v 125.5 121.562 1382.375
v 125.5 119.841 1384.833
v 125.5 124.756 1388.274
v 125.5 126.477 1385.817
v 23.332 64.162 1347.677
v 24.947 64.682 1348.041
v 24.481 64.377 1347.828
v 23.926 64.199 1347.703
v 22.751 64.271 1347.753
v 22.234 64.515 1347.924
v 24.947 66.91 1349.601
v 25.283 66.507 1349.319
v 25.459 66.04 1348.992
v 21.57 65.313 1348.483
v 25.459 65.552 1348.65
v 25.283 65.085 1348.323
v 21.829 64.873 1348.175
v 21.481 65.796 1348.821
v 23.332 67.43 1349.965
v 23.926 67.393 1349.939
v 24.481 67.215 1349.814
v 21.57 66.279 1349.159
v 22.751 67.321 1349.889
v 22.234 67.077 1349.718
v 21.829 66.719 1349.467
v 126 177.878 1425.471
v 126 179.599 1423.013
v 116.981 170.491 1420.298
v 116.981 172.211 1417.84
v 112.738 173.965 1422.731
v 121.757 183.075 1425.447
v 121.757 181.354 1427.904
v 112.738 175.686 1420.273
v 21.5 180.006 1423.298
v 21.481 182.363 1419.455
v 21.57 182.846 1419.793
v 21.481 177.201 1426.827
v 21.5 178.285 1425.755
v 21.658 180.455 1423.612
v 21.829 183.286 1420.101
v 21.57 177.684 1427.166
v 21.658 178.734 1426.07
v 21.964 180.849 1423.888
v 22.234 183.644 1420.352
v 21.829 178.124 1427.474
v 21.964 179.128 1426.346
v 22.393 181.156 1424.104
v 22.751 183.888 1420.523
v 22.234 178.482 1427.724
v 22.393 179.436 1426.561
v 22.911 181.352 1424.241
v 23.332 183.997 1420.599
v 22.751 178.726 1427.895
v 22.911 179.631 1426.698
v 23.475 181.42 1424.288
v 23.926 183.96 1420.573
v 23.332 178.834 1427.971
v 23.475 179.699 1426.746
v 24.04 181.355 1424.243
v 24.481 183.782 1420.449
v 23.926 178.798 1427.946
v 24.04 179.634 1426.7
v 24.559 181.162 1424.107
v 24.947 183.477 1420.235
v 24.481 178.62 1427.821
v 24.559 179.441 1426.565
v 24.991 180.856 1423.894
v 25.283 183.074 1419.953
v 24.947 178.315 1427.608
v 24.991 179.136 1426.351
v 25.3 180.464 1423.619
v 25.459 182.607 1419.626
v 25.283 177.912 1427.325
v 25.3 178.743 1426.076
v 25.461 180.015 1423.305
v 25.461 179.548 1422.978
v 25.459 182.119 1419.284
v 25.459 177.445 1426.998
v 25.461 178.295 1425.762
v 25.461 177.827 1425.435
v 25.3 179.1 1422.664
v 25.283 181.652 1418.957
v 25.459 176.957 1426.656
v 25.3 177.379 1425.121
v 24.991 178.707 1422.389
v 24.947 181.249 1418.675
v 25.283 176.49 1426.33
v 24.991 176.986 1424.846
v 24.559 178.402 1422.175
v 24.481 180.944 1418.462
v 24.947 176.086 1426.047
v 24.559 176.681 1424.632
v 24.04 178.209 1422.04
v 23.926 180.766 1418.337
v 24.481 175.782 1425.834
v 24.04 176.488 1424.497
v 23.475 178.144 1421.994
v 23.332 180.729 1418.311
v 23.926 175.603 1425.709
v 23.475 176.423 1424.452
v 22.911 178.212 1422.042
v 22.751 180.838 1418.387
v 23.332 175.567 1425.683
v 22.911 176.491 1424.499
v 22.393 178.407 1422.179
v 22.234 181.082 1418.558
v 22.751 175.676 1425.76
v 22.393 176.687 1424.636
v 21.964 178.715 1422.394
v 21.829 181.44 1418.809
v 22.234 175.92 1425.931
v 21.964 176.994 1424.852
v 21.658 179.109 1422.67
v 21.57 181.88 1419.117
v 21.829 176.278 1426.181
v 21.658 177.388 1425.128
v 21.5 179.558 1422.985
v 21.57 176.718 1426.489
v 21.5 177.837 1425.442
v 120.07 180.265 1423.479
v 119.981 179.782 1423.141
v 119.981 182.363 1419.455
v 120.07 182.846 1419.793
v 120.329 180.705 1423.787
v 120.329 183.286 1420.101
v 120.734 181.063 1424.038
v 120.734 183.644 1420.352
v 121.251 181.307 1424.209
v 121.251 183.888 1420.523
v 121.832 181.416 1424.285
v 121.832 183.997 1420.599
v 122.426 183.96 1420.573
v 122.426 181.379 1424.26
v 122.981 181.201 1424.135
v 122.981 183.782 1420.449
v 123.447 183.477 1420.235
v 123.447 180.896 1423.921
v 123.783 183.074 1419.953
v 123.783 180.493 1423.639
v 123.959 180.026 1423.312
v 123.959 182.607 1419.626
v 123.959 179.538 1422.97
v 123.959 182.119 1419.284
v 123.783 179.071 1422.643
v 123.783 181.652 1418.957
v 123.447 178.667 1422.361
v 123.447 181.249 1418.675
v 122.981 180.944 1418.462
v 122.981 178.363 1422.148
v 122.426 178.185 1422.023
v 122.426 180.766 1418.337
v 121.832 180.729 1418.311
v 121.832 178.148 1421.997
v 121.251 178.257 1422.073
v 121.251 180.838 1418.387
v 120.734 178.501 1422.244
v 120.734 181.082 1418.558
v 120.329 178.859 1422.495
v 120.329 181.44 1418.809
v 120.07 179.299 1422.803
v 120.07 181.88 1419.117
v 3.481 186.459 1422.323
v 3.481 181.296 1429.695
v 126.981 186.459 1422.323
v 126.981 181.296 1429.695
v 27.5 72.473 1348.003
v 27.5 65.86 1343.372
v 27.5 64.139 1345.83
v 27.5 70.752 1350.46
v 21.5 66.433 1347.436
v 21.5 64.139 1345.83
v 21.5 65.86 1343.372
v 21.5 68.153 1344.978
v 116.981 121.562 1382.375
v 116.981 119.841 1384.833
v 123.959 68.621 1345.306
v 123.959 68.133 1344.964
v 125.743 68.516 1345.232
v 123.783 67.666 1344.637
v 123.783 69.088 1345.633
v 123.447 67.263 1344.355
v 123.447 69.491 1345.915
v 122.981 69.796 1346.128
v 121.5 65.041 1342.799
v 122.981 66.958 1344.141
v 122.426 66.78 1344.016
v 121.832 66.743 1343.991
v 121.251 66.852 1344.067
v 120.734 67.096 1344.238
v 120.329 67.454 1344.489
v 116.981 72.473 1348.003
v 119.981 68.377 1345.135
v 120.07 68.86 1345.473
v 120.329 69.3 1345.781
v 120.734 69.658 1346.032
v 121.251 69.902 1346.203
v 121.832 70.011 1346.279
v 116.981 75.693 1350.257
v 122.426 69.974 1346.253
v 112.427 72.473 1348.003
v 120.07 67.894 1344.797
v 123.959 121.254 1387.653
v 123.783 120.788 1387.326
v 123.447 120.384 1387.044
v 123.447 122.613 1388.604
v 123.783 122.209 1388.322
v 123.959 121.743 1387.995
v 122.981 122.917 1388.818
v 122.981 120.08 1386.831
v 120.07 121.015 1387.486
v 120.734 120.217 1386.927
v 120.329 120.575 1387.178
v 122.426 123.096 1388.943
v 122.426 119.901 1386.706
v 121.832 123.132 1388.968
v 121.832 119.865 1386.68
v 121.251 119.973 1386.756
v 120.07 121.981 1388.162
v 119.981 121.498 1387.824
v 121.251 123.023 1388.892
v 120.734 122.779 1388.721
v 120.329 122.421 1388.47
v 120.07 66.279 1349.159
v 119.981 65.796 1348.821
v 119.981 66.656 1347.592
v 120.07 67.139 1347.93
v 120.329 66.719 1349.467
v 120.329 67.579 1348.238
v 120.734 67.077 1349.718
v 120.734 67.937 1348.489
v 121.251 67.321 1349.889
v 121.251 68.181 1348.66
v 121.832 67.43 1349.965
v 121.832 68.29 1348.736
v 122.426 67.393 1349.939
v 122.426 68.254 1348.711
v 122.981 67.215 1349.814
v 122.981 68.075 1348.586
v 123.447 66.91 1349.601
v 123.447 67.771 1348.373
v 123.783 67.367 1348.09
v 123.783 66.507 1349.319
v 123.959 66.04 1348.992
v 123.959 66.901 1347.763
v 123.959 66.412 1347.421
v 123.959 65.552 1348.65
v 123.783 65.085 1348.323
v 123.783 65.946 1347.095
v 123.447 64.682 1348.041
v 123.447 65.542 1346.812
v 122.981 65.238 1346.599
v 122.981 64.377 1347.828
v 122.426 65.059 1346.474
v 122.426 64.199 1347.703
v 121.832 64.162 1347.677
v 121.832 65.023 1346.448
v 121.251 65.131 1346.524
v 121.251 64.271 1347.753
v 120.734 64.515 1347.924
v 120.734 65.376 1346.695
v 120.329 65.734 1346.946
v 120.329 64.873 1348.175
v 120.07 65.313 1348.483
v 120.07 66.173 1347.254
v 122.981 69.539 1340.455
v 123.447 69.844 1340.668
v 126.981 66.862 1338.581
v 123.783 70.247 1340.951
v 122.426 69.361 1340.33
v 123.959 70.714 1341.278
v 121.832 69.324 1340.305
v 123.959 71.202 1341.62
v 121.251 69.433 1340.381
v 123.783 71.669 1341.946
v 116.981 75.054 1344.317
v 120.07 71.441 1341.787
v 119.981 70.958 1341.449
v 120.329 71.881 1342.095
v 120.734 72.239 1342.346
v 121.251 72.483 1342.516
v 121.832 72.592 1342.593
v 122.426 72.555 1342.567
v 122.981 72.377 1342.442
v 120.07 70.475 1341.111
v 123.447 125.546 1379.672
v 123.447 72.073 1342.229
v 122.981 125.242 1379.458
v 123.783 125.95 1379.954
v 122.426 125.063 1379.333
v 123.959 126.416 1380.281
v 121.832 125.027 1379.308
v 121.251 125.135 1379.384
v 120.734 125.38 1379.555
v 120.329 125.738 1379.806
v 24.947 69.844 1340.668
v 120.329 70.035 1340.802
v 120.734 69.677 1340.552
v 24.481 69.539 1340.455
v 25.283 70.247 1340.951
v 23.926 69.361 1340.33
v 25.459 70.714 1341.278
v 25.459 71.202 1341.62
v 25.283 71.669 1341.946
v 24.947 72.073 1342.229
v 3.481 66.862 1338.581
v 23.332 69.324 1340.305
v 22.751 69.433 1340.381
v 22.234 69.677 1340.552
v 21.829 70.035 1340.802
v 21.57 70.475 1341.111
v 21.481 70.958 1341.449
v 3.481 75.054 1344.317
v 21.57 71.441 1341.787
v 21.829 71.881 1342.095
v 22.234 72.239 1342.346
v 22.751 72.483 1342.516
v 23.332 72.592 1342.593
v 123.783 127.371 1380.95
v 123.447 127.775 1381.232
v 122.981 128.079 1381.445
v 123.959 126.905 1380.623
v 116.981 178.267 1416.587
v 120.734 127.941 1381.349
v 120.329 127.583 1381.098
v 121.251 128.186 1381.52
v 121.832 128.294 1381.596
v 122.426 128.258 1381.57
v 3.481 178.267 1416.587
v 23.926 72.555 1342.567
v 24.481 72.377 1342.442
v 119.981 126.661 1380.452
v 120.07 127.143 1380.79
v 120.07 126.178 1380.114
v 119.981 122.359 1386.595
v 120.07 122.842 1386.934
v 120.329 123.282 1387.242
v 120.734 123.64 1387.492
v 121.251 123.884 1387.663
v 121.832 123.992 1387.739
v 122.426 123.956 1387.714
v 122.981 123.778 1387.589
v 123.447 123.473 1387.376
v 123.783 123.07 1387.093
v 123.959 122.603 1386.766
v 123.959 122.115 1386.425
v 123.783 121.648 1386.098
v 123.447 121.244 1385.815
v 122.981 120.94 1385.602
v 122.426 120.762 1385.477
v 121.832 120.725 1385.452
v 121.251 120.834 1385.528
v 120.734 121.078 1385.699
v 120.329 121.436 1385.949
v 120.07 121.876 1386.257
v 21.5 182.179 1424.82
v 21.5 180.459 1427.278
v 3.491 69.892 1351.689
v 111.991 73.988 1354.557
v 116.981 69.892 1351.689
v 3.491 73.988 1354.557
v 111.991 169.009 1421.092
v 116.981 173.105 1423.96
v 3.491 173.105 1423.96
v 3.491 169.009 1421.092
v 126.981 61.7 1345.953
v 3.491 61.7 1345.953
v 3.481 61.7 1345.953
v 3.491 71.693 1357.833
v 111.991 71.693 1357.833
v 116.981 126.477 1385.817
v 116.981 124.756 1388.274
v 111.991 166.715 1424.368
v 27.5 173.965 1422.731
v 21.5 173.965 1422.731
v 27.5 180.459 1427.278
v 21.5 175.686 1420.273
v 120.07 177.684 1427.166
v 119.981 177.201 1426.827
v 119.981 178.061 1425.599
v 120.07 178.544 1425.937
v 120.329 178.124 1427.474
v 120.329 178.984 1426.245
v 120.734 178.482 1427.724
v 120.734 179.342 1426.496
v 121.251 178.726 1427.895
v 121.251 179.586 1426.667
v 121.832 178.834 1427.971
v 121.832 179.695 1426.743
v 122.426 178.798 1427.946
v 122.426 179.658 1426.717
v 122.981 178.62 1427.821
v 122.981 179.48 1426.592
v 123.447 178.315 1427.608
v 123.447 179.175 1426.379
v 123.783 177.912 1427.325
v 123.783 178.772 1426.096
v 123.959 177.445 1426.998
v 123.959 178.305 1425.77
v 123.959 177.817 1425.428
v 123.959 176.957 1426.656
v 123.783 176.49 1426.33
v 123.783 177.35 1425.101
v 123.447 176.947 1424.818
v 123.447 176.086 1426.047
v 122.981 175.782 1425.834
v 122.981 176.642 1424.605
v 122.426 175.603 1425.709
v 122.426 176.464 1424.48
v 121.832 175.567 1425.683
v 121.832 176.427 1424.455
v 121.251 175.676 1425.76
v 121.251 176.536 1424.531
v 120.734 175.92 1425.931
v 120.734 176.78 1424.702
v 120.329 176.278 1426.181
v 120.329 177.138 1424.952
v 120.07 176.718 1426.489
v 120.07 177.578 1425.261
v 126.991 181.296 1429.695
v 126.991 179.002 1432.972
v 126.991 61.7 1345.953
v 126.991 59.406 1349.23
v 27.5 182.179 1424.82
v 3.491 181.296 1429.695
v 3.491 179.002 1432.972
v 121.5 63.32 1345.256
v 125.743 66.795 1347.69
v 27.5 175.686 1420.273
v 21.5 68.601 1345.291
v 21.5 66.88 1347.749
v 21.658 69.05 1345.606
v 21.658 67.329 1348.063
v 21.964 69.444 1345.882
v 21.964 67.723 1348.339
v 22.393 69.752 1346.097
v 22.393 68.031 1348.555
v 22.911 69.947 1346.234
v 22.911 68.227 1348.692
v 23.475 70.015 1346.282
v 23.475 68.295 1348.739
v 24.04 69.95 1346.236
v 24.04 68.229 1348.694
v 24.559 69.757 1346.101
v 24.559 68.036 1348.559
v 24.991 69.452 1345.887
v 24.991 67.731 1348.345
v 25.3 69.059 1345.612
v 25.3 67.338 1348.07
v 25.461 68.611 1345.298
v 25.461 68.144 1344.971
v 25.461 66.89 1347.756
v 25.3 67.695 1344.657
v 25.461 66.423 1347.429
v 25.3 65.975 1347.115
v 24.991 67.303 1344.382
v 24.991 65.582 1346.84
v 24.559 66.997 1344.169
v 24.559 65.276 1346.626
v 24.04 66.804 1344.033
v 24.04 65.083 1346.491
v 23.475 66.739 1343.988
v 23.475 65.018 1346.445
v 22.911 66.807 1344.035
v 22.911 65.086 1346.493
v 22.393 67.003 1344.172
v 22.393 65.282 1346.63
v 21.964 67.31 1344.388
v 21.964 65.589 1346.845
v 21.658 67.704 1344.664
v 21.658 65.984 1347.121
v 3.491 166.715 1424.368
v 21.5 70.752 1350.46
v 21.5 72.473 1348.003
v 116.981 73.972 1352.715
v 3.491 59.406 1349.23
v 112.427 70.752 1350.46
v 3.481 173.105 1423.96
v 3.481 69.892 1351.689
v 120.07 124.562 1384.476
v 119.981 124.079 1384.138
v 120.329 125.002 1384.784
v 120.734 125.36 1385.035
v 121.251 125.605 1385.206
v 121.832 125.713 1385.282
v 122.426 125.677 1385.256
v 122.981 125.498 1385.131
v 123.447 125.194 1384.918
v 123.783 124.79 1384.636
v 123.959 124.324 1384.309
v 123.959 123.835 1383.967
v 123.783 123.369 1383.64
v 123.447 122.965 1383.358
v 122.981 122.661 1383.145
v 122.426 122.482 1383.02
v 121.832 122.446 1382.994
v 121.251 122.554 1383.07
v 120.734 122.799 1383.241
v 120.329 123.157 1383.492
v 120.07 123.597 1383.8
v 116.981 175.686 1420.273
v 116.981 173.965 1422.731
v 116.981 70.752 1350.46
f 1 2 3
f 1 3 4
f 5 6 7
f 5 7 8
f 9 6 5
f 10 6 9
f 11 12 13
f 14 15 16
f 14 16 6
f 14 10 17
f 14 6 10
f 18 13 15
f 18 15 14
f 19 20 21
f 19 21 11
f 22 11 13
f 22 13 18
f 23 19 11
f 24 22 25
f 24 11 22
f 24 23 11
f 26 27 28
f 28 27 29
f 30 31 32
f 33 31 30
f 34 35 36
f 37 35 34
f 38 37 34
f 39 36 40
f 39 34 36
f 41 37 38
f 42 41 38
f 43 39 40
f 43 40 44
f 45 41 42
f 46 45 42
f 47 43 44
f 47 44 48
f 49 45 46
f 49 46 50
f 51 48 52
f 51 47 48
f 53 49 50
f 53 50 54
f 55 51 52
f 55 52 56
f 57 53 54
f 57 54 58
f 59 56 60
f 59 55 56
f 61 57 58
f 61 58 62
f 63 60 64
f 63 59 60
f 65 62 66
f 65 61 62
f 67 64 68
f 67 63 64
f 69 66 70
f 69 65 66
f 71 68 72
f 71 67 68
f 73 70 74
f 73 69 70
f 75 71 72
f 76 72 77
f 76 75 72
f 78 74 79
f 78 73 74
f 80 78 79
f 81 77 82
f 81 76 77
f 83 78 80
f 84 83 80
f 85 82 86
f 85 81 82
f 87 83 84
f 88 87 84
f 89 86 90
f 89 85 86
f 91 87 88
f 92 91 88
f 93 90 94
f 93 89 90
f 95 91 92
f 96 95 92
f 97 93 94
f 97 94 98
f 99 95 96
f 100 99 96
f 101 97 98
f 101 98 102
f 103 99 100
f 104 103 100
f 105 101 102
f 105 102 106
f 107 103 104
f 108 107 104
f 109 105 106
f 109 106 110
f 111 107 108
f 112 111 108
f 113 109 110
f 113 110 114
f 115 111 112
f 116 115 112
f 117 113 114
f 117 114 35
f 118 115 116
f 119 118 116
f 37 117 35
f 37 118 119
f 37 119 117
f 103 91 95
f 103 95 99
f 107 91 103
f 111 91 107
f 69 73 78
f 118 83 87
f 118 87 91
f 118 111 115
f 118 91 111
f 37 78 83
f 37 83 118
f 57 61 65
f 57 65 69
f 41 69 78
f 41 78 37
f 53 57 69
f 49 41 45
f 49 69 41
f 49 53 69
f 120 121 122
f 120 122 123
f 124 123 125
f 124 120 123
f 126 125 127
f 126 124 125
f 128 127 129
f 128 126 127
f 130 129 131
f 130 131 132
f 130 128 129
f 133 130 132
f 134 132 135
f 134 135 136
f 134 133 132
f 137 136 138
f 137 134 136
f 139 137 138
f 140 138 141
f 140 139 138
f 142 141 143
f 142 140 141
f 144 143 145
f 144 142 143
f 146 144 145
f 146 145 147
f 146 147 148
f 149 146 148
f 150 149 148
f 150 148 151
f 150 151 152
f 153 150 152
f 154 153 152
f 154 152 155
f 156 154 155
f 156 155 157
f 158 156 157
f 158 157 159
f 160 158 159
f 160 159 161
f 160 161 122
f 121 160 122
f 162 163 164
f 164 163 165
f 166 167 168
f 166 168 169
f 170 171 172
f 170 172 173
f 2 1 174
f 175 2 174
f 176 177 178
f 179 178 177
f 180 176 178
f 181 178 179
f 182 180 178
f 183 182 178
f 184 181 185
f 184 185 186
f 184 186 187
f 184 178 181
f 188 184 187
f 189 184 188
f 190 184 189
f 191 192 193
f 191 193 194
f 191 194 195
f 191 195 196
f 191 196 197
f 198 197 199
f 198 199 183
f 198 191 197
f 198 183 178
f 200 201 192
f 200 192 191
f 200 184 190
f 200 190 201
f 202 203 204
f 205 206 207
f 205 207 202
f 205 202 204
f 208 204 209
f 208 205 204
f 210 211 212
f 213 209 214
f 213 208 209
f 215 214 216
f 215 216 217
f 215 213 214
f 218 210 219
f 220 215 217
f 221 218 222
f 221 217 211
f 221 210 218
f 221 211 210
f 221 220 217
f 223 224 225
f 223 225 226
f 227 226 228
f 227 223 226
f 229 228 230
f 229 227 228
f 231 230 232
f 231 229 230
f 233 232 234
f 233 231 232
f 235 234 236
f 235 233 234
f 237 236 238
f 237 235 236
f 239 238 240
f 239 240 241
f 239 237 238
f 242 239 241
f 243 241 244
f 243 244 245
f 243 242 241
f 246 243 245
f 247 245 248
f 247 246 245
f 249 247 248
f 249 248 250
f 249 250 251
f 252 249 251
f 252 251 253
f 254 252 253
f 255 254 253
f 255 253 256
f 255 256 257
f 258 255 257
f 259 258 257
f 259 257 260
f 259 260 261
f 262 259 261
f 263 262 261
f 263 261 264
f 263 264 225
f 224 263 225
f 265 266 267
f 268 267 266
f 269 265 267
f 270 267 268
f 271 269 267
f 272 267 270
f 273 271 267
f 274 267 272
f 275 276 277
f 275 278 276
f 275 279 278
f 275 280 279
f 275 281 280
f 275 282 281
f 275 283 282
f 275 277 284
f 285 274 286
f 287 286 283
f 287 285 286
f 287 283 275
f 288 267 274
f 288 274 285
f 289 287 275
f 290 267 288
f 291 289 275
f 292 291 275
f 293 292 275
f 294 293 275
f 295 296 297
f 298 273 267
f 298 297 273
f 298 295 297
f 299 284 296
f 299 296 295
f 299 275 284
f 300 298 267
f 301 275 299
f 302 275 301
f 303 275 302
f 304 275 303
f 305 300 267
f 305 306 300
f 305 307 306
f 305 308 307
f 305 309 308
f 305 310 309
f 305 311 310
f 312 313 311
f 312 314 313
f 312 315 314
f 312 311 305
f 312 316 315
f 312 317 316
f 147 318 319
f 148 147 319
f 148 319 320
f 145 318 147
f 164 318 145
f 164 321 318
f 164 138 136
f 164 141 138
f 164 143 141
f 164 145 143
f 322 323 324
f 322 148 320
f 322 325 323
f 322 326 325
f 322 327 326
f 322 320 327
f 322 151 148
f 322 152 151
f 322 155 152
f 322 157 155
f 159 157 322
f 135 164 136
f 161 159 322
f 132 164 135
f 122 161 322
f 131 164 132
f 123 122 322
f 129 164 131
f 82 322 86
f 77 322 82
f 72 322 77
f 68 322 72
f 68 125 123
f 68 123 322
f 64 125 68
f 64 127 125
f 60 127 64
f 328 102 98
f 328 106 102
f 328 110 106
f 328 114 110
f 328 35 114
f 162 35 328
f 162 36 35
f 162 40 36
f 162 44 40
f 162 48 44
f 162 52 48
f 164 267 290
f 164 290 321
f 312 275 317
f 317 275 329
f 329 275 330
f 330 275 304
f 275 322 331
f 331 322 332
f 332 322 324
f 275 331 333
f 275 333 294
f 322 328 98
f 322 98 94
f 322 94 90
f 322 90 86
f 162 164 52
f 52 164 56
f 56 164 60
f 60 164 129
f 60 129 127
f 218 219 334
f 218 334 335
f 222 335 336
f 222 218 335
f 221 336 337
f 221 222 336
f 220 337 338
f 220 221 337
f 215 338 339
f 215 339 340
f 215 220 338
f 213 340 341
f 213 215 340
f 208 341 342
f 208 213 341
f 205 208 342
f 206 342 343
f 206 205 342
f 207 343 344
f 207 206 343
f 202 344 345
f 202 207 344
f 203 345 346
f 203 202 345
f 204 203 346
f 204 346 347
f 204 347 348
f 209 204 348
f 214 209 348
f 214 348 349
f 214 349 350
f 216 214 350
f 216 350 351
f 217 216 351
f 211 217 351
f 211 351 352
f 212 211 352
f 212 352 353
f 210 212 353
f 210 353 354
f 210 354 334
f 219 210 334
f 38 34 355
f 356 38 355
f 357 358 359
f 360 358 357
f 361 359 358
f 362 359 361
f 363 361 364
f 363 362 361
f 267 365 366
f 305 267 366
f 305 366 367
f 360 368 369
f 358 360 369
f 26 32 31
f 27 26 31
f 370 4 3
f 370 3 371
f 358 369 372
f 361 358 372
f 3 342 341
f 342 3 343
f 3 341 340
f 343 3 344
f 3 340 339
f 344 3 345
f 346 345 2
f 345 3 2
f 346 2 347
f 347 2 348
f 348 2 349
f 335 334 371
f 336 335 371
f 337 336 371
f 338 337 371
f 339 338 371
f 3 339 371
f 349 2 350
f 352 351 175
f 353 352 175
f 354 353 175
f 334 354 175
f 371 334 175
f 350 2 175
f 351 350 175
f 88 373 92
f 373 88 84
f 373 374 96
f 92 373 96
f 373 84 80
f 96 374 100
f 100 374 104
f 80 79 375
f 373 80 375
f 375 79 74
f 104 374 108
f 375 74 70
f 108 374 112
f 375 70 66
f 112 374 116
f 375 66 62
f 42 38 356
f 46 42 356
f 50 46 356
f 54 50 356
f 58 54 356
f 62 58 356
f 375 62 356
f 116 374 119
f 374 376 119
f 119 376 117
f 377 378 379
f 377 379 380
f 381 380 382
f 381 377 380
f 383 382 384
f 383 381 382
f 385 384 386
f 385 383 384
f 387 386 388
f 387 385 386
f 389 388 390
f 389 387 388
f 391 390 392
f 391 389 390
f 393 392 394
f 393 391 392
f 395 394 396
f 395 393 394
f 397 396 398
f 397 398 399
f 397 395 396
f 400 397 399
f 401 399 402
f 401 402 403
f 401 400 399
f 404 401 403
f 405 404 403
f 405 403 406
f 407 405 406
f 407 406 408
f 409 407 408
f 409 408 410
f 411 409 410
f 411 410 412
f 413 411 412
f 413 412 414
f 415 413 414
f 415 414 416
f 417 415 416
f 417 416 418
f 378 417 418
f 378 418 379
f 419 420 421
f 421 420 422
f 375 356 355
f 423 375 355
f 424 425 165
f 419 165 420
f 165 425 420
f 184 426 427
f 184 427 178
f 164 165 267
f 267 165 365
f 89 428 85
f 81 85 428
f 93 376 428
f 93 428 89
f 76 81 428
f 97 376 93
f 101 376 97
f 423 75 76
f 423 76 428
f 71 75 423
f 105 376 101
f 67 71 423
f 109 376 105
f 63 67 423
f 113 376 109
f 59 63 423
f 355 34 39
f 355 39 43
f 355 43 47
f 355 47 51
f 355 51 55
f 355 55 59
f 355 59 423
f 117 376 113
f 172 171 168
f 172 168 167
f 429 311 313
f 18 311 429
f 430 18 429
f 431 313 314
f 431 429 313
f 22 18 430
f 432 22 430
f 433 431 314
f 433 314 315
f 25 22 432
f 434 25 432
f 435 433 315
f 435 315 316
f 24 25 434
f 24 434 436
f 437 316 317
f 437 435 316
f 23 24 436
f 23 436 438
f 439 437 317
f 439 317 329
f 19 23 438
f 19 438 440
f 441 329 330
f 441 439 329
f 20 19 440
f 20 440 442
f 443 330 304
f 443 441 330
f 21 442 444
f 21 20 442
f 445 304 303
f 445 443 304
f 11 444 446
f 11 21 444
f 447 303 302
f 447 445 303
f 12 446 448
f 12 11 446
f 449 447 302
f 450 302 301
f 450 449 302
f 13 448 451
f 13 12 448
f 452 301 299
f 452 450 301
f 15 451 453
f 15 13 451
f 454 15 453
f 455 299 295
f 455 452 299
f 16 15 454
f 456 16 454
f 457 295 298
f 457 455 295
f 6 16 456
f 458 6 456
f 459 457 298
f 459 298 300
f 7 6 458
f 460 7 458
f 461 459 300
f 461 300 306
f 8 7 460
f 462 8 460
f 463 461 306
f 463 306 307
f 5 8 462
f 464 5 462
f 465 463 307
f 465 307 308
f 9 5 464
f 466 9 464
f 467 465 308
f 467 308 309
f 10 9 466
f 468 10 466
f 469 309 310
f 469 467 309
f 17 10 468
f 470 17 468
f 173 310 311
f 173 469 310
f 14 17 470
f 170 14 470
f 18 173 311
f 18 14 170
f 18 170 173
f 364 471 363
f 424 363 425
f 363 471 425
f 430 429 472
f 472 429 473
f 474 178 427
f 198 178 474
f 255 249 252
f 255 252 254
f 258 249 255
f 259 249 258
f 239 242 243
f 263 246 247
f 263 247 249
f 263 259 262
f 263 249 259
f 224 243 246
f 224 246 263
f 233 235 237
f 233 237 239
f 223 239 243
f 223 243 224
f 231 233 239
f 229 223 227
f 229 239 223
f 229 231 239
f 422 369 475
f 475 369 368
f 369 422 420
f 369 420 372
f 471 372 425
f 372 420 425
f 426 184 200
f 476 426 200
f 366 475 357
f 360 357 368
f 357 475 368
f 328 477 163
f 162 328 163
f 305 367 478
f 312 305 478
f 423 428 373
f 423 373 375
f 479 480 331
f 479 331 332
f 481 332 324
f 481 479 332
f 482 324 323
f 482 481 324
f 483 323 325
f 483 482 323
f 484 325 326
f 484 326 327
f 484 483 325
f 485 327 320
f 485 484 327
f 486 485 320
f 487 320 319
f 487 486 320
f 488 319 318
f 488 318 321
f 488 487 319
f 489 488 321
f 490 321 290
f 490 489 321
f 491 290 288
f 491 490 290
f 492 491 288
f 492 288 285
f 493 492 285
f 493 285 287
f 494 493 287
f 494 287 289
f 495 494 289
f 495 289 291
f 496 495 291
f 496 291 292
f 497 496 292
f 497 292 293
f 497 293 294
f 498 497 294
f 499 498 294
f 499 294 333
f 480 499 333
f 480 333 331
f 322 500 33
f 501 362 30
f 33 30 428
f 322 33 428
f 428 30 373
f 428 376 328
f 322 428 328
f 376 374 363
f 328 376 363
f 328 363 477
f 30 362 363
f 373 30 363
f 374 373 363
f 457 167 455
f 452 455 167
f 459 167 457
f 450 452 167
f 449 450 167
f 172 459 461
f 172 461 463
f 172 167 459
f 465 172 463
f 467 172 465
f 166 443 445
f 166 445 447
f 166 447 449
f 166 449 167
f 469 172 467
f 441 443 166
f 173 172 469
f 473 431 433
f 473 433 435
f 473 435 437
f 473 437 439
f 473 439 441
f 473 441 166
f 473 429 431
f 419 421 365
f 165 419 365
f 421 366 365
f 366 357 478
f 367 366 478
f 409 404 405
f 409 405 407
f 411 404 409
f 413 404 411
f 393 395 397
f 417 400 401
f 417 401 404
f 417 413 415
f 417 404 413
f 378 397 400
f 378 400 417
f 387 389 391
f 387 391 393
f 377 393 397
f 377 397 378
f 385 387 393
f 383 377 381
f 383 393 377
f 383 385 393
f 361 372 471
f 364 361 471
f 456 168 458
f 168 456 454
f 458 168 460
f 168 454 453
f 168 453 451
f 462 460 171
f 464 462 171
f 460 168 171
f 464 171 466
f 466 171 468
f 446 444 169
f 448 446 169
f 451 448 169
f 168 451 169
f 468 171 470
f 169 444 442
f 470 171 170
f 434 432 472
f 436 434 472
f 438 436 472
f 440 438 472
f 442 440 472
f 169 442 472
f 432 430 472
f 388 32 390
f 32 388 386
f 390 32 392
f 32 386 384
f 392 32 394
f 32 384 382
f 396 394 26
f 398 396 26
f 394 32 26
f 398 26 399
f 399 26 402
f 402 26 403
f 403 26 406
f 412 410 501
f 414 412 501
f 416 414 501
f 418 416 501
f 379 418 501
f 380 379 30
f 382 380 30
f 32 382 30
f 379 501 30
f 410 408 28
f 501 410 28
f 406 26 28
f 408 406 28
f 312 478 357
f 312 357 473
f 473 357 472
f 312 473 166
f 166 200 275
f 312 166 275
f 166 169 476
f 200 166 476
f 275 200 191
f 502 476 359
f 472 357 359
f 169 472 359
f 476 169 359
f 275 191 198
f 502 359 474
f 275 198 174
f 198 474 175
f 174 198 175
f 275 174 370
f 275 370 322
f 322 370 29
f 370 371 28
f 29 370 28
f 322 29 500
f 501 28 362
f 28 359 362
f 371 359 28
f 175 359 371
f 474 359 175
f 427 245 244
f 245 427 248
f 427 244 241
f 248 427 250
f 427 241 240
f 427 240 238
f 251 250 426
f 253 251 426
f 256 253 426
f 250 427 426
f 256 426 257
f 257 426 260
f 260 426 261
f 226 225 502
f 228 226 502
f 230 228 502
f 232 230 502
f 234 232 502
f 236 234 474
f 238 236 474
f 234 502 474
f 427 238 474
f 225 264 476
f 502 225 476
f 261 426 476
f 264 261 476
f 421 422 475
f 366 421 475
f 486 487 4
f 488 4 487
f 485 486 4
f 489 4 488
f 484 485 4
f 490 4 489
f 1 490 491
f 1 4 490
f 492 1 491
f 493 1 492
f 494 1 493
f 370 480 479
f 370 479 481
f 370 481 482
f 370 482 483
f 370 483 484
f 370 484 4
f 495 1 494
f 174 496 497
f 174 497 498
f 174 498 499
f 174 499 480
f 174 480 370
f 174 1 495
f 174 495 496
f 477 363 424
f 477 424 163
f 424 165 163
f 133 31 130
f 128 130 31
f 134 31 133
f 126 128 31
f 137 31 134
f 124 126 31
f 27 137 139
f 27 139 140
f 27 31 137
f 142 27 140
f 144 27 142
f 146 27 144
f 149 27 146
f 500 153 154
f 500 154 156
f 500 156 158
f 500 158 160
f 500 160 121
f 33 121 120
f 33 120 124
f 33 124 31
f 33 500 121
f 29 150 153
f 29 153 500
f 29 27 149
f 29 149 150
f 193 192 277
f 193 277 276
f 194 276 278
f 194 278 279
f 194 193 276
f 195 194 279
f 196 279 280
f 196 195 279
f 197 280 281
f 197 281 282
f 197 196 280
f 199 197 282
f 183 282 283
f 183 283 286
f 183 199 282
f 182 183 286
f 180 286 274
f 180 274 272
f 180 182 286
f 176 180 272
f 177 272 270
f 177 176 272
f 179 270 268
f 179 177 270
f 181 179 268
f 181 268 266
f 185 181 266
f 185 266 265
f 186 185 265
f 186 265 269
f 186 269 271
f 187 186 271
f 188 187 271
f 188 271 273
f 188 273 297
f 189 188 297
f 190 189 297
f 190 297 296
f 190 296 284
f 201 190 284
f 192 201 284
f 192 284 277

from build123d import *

# Parameters (mm, degrees)
BOX053_W                             = 15
BOX053_H                             = 3
BOX053_DEPTH                         = 6
BOX053_PITCH_ANGLE                   = 45
BOX054_W                             = 15
BOX054_H                             = 3
BOX054_DEPTH                         = 6
BOX054_PITCH_ANGLE                   = -45
BOX052_W                             = 9
BOX052_H                             = 3
BOX052_DEPTH                         = 6
BOX055_W                             = 15
BOX055_H                             = 3
BOX055_DEPTH                         = 6
BOX055_PITCH_ANGLE                   = -90
BOX056_W                             = 15
BOX056_H                             = 3
BOX056_DEPTH                         = 6
BOX056_PITCH_ANGLE                   = -90
SKETCH035_AS_DRAWN_R                 = 2
EXTRUDE033_DEPTH                     = 9
EXTRUDE033_ONTO_SKETCH035_ROLL_ANGLE = 90
EXTRUDE032_DEPTH                     = 4
EXTRUDE032_ONTO_SKETCH034_ROLL_ANGLE = 90
FUSION128_PLACEMENT_ANGLE            = 55


with BuildPart() as nut_hole004:
    # Box053 → Box053 (new body)
    with BuildSketch(Plane.XY):
        with Locations((7.5, 1.5)):
            Rectangle(BOX053_W, BOX053_H)
    extrude(amount=BOX053_DEPTH)


with BuildPart() as nut_hole004_1:
    # Box053 pitch: moved
    add(nut_hole004.part.rotate(Axis((0, 0, 0), (0, 1, 0)), BOX053_PITCH_ANGLE))


with BuildPart() as nut_hole004_2:
    # Box053 placement: moved
    add(nut_hole004_1.part.moved(Location((-81, 5, 130.6))))


with BuildPart() as nut_hole005:
    # Box054 → Box054 (new body)
    with BuildSketch(Plane.XY):
        with Locations((7.5, 1.5)):
            Rectangle(BOX054_W, BOX054_H)
    extrude(amount=BOX054_DEPTH)


with BuildPart() as nut_hole005_1:
    # Box054 pitch: moved
    add(nut_hole005.part.rotate(Axis((0, 0, 0), (0, 1, 0)), BOX054_PITCH_ANGLE))


with BuildPart() as nut_hole005_2:
    # Box054 placement: moved
    add(nut_hole005_1.part.moved(Location((-76.5, 5, -9.25))))


with BuildPart() as nut_hole003:
    # Box052 → Box052 (new body)
    with BuildSketch(Plane(origin=(-80.5, 5, 59.75), x_dir=(1, 0, 0), z_dir=(0, 0, 1))):
        with Locations((4.5, 1.5)):
            Rectangle(BOX052_W, BOX052_H)
    extrude(amount=BOX052_DEPTH)


with BuildPart() as nut_hole006:
    # Box055 → Box055 (new body)
    with BuildSketch(Plane.XY):
        with Locations((7.5, 1.5)):
            Rectangle(BOX055_W, BOX055_H)
    extrude(amount=BOX055_DEPTH)


with BuildPart() as nut_hole006_1:
    # Box055 pitch: moved
    add(nut_hole006.part.rotate(Axis((0, 0, 0), (0, 1, 0)), BOX055_PITCH_ANGLE))


with BuildPart() as nut_hole006_2:
    # Box055 placement: moved
    add(nut_hole006_1.part.moved(Location((23.5, 5, -8.25))))


with BuildPart() as nut_holes_right_dimensions:
    # Box056 → Box056 (new body)
    with BuildSketch(Plane.XY):
        with Locations((7.5, 1.5)):
            Rectangle(BOX056_W, BOX056_H)
    extrude(amount=BOX056_DEPTH)


with BuildPart() as nut_holes_right_dimensions_1:
    # Box056 pitch: moved
    add(nut_holes_right_dimensions.part.rotate(Axis((0, 0, 0), (0, 1, 0)), BOX056_PITCH_ANGLE))


with BuildPart() as nut_holes_right_dimensions_2:
    # Box056 placement: moved
    add(nut_holes_right_dimensions_1.part.moved(Location((23.5, 5, 118.75))))

    # Fusion099: union Nut hole004, Nut hole005, Nut hole003, Nut hole006
    add(nut_hole004_2.part)
    add(nut_hole005_2.part)
    add(nut_hole003.part)
    add(nut_hole006_2.part)


with BuildPart() as nut_holes_right_dimensions_3:
    # Fusion099 placement: moved
    add(nut_holes_right_dimensions_2.part.moved(Location((0, -3, 0))))


with BuildPart() as upper_tablet_holder_002_with_nut_holes:
    # Sketch035 as drawn → Extrude033 (new)
    with BuildSketch(Plane.XY):
        Polygon((-81.020079, 134.137773), (-81.020079, -11.862227), (42.479921, -11.862227), (42.479921, -1.862227), (-71.020079, -1.862227), (-71.020079, 124.137773), (42.479921, 124.137773), (42.479921, 134.137773), align=None)
        with Locations((-76.020079, 129.137773)):
            Circle(SKETCH035_AS_DRAWN_R, mode=Mode.SUBTRACT)
        with Locations((22.479921, 129.137773)):
            Circle(SKETCH035_AS_DRAWN_R, mode=Mode.SUBTRACT)
        with Locations((-76.020079, 61.137773)):
            Circle(SKETCH035_AS_DRAWN_R, mode=Mode.SUBTRACT)
        with Locations((-76.020079, -6.862227)):
            Circle(SKETCH035_AS_DRAWN_R, mode=Mode.SUBTRACT)
        with Locations((22.479921, -6.862227)):
            Circle(SKETCH035_AS_DRAWN_R, mode=Mode.SUBTRACT)
    extrude(amount=-EXTRUDE033_DEPTH)


with BuildPart() as upper_tablet_holder_002_with_nut_holes_1:
    # Extrude033 onto Sketch035 roll: moved
    add(upper_tablet_holder_002_with_nut_holes.part.rotate(Axis((0, 0, 0), (1, 0, 0)), EXTRUDE033_ONTO_SKETCH035_ROLL_ANGLE))


with BuildPart() as upper_tablet_holder_002_with_nut_holes_2:
    # Extrude033 onto Sketch035 placement: moved
    add(upper_tablet_holder_002_with_nut_holes_1.part)


with BuildPart() as upper_tablet_holder_002_with_nut_holes_3:
    # Extrude033 placement: moved
    add(upper_tablet_holder_002_with_nut_holes_2.part.moved(Location((-0.961188, 0.5, 1.685213))))

    # Cut059: cut Nut holes - right dimensions
    add(nut_holes_right_dimensions_3.part, mode=Mode.SUBTRACT)


with BuildPart() as upper_tablet_holder_002_with_nut_holes_4:
    # Cut059 placement: moved
    add(upper_tablet_holder_002_with_nut_holes_3.part.moved(Location((-0.5, 0, 0))))


with BuildPart() as upper_tablet_holder001:
    # Sketch034 as drawn → Extrude032 (new)
    with BuildSketch(Plane.XY):
        Polygon((-82.797703, 136.012411), (-82.797703, -9.987589), (40.702297, -9.987589), (40.702297, 5.012411), (-67.797703, 5.012411), (-67.797703, 121.012411), (40.702297, 121.012411), (40.702297, 136.012411), align=None)
    extrude(amount=-EXTRUDE032_DEPTH)


with BuildPart() as upper_tablet_holder001_1:
    # Extrude032 onto Sketch034 roll: moved
    add(upper_tablet_holder001.part.rotate(Axis((0, 0, 0), (1, 0, 0)), EXTRUDE032_ONTO_SKETCH034_ROLL_ANGLE))


with BuildPart() as upper_tablet_holder001_2:
    # Extrude032 onto Sketch034 placement: moved
    add(upper_tablet_holder001_1.part)


with BuildPart() as upper_tablet_holder001_3:
    # Extrude032 placement: moved
    add(upper_tablet_holder001_2.part.moved(Location((0.307074, -3.5, -0.189426))))

    # Fusion128: union Upper tablet holder 002 with nut holes
    add(upper_tablet_holder_002_with_nut_holes_4.part)


with BuildPart() as upper_tablet_holder001_4:
    # Fusion128 placement: moved
    add(upper_tablet_holder001_3.part.rotate(Axis((0, 0, 0), (-1, 0, 0)), FUSION128_PLACEMENT_ANGLE))


with BuildPart() as upper_tablet_holder_left:
    # Part__Mirroring006: instance of Upper tablet holder001
    add(upper_tablet_holder001_4.part.mirror(Plane(origin=(41.000008, 53.182304, 33.576321), x_dir=(0, -1, 0), z_dir=(1, 0, 0))))


with BuildPart() as upper_tablet_holder_left_1:
    # Part__Mirroring006 placement: moved
    add(upper_tablet_holder_left.part.moved(Location((-37.5, 69.75, 1352.2))))


solid = upper_tablet_holder_left_1.part
